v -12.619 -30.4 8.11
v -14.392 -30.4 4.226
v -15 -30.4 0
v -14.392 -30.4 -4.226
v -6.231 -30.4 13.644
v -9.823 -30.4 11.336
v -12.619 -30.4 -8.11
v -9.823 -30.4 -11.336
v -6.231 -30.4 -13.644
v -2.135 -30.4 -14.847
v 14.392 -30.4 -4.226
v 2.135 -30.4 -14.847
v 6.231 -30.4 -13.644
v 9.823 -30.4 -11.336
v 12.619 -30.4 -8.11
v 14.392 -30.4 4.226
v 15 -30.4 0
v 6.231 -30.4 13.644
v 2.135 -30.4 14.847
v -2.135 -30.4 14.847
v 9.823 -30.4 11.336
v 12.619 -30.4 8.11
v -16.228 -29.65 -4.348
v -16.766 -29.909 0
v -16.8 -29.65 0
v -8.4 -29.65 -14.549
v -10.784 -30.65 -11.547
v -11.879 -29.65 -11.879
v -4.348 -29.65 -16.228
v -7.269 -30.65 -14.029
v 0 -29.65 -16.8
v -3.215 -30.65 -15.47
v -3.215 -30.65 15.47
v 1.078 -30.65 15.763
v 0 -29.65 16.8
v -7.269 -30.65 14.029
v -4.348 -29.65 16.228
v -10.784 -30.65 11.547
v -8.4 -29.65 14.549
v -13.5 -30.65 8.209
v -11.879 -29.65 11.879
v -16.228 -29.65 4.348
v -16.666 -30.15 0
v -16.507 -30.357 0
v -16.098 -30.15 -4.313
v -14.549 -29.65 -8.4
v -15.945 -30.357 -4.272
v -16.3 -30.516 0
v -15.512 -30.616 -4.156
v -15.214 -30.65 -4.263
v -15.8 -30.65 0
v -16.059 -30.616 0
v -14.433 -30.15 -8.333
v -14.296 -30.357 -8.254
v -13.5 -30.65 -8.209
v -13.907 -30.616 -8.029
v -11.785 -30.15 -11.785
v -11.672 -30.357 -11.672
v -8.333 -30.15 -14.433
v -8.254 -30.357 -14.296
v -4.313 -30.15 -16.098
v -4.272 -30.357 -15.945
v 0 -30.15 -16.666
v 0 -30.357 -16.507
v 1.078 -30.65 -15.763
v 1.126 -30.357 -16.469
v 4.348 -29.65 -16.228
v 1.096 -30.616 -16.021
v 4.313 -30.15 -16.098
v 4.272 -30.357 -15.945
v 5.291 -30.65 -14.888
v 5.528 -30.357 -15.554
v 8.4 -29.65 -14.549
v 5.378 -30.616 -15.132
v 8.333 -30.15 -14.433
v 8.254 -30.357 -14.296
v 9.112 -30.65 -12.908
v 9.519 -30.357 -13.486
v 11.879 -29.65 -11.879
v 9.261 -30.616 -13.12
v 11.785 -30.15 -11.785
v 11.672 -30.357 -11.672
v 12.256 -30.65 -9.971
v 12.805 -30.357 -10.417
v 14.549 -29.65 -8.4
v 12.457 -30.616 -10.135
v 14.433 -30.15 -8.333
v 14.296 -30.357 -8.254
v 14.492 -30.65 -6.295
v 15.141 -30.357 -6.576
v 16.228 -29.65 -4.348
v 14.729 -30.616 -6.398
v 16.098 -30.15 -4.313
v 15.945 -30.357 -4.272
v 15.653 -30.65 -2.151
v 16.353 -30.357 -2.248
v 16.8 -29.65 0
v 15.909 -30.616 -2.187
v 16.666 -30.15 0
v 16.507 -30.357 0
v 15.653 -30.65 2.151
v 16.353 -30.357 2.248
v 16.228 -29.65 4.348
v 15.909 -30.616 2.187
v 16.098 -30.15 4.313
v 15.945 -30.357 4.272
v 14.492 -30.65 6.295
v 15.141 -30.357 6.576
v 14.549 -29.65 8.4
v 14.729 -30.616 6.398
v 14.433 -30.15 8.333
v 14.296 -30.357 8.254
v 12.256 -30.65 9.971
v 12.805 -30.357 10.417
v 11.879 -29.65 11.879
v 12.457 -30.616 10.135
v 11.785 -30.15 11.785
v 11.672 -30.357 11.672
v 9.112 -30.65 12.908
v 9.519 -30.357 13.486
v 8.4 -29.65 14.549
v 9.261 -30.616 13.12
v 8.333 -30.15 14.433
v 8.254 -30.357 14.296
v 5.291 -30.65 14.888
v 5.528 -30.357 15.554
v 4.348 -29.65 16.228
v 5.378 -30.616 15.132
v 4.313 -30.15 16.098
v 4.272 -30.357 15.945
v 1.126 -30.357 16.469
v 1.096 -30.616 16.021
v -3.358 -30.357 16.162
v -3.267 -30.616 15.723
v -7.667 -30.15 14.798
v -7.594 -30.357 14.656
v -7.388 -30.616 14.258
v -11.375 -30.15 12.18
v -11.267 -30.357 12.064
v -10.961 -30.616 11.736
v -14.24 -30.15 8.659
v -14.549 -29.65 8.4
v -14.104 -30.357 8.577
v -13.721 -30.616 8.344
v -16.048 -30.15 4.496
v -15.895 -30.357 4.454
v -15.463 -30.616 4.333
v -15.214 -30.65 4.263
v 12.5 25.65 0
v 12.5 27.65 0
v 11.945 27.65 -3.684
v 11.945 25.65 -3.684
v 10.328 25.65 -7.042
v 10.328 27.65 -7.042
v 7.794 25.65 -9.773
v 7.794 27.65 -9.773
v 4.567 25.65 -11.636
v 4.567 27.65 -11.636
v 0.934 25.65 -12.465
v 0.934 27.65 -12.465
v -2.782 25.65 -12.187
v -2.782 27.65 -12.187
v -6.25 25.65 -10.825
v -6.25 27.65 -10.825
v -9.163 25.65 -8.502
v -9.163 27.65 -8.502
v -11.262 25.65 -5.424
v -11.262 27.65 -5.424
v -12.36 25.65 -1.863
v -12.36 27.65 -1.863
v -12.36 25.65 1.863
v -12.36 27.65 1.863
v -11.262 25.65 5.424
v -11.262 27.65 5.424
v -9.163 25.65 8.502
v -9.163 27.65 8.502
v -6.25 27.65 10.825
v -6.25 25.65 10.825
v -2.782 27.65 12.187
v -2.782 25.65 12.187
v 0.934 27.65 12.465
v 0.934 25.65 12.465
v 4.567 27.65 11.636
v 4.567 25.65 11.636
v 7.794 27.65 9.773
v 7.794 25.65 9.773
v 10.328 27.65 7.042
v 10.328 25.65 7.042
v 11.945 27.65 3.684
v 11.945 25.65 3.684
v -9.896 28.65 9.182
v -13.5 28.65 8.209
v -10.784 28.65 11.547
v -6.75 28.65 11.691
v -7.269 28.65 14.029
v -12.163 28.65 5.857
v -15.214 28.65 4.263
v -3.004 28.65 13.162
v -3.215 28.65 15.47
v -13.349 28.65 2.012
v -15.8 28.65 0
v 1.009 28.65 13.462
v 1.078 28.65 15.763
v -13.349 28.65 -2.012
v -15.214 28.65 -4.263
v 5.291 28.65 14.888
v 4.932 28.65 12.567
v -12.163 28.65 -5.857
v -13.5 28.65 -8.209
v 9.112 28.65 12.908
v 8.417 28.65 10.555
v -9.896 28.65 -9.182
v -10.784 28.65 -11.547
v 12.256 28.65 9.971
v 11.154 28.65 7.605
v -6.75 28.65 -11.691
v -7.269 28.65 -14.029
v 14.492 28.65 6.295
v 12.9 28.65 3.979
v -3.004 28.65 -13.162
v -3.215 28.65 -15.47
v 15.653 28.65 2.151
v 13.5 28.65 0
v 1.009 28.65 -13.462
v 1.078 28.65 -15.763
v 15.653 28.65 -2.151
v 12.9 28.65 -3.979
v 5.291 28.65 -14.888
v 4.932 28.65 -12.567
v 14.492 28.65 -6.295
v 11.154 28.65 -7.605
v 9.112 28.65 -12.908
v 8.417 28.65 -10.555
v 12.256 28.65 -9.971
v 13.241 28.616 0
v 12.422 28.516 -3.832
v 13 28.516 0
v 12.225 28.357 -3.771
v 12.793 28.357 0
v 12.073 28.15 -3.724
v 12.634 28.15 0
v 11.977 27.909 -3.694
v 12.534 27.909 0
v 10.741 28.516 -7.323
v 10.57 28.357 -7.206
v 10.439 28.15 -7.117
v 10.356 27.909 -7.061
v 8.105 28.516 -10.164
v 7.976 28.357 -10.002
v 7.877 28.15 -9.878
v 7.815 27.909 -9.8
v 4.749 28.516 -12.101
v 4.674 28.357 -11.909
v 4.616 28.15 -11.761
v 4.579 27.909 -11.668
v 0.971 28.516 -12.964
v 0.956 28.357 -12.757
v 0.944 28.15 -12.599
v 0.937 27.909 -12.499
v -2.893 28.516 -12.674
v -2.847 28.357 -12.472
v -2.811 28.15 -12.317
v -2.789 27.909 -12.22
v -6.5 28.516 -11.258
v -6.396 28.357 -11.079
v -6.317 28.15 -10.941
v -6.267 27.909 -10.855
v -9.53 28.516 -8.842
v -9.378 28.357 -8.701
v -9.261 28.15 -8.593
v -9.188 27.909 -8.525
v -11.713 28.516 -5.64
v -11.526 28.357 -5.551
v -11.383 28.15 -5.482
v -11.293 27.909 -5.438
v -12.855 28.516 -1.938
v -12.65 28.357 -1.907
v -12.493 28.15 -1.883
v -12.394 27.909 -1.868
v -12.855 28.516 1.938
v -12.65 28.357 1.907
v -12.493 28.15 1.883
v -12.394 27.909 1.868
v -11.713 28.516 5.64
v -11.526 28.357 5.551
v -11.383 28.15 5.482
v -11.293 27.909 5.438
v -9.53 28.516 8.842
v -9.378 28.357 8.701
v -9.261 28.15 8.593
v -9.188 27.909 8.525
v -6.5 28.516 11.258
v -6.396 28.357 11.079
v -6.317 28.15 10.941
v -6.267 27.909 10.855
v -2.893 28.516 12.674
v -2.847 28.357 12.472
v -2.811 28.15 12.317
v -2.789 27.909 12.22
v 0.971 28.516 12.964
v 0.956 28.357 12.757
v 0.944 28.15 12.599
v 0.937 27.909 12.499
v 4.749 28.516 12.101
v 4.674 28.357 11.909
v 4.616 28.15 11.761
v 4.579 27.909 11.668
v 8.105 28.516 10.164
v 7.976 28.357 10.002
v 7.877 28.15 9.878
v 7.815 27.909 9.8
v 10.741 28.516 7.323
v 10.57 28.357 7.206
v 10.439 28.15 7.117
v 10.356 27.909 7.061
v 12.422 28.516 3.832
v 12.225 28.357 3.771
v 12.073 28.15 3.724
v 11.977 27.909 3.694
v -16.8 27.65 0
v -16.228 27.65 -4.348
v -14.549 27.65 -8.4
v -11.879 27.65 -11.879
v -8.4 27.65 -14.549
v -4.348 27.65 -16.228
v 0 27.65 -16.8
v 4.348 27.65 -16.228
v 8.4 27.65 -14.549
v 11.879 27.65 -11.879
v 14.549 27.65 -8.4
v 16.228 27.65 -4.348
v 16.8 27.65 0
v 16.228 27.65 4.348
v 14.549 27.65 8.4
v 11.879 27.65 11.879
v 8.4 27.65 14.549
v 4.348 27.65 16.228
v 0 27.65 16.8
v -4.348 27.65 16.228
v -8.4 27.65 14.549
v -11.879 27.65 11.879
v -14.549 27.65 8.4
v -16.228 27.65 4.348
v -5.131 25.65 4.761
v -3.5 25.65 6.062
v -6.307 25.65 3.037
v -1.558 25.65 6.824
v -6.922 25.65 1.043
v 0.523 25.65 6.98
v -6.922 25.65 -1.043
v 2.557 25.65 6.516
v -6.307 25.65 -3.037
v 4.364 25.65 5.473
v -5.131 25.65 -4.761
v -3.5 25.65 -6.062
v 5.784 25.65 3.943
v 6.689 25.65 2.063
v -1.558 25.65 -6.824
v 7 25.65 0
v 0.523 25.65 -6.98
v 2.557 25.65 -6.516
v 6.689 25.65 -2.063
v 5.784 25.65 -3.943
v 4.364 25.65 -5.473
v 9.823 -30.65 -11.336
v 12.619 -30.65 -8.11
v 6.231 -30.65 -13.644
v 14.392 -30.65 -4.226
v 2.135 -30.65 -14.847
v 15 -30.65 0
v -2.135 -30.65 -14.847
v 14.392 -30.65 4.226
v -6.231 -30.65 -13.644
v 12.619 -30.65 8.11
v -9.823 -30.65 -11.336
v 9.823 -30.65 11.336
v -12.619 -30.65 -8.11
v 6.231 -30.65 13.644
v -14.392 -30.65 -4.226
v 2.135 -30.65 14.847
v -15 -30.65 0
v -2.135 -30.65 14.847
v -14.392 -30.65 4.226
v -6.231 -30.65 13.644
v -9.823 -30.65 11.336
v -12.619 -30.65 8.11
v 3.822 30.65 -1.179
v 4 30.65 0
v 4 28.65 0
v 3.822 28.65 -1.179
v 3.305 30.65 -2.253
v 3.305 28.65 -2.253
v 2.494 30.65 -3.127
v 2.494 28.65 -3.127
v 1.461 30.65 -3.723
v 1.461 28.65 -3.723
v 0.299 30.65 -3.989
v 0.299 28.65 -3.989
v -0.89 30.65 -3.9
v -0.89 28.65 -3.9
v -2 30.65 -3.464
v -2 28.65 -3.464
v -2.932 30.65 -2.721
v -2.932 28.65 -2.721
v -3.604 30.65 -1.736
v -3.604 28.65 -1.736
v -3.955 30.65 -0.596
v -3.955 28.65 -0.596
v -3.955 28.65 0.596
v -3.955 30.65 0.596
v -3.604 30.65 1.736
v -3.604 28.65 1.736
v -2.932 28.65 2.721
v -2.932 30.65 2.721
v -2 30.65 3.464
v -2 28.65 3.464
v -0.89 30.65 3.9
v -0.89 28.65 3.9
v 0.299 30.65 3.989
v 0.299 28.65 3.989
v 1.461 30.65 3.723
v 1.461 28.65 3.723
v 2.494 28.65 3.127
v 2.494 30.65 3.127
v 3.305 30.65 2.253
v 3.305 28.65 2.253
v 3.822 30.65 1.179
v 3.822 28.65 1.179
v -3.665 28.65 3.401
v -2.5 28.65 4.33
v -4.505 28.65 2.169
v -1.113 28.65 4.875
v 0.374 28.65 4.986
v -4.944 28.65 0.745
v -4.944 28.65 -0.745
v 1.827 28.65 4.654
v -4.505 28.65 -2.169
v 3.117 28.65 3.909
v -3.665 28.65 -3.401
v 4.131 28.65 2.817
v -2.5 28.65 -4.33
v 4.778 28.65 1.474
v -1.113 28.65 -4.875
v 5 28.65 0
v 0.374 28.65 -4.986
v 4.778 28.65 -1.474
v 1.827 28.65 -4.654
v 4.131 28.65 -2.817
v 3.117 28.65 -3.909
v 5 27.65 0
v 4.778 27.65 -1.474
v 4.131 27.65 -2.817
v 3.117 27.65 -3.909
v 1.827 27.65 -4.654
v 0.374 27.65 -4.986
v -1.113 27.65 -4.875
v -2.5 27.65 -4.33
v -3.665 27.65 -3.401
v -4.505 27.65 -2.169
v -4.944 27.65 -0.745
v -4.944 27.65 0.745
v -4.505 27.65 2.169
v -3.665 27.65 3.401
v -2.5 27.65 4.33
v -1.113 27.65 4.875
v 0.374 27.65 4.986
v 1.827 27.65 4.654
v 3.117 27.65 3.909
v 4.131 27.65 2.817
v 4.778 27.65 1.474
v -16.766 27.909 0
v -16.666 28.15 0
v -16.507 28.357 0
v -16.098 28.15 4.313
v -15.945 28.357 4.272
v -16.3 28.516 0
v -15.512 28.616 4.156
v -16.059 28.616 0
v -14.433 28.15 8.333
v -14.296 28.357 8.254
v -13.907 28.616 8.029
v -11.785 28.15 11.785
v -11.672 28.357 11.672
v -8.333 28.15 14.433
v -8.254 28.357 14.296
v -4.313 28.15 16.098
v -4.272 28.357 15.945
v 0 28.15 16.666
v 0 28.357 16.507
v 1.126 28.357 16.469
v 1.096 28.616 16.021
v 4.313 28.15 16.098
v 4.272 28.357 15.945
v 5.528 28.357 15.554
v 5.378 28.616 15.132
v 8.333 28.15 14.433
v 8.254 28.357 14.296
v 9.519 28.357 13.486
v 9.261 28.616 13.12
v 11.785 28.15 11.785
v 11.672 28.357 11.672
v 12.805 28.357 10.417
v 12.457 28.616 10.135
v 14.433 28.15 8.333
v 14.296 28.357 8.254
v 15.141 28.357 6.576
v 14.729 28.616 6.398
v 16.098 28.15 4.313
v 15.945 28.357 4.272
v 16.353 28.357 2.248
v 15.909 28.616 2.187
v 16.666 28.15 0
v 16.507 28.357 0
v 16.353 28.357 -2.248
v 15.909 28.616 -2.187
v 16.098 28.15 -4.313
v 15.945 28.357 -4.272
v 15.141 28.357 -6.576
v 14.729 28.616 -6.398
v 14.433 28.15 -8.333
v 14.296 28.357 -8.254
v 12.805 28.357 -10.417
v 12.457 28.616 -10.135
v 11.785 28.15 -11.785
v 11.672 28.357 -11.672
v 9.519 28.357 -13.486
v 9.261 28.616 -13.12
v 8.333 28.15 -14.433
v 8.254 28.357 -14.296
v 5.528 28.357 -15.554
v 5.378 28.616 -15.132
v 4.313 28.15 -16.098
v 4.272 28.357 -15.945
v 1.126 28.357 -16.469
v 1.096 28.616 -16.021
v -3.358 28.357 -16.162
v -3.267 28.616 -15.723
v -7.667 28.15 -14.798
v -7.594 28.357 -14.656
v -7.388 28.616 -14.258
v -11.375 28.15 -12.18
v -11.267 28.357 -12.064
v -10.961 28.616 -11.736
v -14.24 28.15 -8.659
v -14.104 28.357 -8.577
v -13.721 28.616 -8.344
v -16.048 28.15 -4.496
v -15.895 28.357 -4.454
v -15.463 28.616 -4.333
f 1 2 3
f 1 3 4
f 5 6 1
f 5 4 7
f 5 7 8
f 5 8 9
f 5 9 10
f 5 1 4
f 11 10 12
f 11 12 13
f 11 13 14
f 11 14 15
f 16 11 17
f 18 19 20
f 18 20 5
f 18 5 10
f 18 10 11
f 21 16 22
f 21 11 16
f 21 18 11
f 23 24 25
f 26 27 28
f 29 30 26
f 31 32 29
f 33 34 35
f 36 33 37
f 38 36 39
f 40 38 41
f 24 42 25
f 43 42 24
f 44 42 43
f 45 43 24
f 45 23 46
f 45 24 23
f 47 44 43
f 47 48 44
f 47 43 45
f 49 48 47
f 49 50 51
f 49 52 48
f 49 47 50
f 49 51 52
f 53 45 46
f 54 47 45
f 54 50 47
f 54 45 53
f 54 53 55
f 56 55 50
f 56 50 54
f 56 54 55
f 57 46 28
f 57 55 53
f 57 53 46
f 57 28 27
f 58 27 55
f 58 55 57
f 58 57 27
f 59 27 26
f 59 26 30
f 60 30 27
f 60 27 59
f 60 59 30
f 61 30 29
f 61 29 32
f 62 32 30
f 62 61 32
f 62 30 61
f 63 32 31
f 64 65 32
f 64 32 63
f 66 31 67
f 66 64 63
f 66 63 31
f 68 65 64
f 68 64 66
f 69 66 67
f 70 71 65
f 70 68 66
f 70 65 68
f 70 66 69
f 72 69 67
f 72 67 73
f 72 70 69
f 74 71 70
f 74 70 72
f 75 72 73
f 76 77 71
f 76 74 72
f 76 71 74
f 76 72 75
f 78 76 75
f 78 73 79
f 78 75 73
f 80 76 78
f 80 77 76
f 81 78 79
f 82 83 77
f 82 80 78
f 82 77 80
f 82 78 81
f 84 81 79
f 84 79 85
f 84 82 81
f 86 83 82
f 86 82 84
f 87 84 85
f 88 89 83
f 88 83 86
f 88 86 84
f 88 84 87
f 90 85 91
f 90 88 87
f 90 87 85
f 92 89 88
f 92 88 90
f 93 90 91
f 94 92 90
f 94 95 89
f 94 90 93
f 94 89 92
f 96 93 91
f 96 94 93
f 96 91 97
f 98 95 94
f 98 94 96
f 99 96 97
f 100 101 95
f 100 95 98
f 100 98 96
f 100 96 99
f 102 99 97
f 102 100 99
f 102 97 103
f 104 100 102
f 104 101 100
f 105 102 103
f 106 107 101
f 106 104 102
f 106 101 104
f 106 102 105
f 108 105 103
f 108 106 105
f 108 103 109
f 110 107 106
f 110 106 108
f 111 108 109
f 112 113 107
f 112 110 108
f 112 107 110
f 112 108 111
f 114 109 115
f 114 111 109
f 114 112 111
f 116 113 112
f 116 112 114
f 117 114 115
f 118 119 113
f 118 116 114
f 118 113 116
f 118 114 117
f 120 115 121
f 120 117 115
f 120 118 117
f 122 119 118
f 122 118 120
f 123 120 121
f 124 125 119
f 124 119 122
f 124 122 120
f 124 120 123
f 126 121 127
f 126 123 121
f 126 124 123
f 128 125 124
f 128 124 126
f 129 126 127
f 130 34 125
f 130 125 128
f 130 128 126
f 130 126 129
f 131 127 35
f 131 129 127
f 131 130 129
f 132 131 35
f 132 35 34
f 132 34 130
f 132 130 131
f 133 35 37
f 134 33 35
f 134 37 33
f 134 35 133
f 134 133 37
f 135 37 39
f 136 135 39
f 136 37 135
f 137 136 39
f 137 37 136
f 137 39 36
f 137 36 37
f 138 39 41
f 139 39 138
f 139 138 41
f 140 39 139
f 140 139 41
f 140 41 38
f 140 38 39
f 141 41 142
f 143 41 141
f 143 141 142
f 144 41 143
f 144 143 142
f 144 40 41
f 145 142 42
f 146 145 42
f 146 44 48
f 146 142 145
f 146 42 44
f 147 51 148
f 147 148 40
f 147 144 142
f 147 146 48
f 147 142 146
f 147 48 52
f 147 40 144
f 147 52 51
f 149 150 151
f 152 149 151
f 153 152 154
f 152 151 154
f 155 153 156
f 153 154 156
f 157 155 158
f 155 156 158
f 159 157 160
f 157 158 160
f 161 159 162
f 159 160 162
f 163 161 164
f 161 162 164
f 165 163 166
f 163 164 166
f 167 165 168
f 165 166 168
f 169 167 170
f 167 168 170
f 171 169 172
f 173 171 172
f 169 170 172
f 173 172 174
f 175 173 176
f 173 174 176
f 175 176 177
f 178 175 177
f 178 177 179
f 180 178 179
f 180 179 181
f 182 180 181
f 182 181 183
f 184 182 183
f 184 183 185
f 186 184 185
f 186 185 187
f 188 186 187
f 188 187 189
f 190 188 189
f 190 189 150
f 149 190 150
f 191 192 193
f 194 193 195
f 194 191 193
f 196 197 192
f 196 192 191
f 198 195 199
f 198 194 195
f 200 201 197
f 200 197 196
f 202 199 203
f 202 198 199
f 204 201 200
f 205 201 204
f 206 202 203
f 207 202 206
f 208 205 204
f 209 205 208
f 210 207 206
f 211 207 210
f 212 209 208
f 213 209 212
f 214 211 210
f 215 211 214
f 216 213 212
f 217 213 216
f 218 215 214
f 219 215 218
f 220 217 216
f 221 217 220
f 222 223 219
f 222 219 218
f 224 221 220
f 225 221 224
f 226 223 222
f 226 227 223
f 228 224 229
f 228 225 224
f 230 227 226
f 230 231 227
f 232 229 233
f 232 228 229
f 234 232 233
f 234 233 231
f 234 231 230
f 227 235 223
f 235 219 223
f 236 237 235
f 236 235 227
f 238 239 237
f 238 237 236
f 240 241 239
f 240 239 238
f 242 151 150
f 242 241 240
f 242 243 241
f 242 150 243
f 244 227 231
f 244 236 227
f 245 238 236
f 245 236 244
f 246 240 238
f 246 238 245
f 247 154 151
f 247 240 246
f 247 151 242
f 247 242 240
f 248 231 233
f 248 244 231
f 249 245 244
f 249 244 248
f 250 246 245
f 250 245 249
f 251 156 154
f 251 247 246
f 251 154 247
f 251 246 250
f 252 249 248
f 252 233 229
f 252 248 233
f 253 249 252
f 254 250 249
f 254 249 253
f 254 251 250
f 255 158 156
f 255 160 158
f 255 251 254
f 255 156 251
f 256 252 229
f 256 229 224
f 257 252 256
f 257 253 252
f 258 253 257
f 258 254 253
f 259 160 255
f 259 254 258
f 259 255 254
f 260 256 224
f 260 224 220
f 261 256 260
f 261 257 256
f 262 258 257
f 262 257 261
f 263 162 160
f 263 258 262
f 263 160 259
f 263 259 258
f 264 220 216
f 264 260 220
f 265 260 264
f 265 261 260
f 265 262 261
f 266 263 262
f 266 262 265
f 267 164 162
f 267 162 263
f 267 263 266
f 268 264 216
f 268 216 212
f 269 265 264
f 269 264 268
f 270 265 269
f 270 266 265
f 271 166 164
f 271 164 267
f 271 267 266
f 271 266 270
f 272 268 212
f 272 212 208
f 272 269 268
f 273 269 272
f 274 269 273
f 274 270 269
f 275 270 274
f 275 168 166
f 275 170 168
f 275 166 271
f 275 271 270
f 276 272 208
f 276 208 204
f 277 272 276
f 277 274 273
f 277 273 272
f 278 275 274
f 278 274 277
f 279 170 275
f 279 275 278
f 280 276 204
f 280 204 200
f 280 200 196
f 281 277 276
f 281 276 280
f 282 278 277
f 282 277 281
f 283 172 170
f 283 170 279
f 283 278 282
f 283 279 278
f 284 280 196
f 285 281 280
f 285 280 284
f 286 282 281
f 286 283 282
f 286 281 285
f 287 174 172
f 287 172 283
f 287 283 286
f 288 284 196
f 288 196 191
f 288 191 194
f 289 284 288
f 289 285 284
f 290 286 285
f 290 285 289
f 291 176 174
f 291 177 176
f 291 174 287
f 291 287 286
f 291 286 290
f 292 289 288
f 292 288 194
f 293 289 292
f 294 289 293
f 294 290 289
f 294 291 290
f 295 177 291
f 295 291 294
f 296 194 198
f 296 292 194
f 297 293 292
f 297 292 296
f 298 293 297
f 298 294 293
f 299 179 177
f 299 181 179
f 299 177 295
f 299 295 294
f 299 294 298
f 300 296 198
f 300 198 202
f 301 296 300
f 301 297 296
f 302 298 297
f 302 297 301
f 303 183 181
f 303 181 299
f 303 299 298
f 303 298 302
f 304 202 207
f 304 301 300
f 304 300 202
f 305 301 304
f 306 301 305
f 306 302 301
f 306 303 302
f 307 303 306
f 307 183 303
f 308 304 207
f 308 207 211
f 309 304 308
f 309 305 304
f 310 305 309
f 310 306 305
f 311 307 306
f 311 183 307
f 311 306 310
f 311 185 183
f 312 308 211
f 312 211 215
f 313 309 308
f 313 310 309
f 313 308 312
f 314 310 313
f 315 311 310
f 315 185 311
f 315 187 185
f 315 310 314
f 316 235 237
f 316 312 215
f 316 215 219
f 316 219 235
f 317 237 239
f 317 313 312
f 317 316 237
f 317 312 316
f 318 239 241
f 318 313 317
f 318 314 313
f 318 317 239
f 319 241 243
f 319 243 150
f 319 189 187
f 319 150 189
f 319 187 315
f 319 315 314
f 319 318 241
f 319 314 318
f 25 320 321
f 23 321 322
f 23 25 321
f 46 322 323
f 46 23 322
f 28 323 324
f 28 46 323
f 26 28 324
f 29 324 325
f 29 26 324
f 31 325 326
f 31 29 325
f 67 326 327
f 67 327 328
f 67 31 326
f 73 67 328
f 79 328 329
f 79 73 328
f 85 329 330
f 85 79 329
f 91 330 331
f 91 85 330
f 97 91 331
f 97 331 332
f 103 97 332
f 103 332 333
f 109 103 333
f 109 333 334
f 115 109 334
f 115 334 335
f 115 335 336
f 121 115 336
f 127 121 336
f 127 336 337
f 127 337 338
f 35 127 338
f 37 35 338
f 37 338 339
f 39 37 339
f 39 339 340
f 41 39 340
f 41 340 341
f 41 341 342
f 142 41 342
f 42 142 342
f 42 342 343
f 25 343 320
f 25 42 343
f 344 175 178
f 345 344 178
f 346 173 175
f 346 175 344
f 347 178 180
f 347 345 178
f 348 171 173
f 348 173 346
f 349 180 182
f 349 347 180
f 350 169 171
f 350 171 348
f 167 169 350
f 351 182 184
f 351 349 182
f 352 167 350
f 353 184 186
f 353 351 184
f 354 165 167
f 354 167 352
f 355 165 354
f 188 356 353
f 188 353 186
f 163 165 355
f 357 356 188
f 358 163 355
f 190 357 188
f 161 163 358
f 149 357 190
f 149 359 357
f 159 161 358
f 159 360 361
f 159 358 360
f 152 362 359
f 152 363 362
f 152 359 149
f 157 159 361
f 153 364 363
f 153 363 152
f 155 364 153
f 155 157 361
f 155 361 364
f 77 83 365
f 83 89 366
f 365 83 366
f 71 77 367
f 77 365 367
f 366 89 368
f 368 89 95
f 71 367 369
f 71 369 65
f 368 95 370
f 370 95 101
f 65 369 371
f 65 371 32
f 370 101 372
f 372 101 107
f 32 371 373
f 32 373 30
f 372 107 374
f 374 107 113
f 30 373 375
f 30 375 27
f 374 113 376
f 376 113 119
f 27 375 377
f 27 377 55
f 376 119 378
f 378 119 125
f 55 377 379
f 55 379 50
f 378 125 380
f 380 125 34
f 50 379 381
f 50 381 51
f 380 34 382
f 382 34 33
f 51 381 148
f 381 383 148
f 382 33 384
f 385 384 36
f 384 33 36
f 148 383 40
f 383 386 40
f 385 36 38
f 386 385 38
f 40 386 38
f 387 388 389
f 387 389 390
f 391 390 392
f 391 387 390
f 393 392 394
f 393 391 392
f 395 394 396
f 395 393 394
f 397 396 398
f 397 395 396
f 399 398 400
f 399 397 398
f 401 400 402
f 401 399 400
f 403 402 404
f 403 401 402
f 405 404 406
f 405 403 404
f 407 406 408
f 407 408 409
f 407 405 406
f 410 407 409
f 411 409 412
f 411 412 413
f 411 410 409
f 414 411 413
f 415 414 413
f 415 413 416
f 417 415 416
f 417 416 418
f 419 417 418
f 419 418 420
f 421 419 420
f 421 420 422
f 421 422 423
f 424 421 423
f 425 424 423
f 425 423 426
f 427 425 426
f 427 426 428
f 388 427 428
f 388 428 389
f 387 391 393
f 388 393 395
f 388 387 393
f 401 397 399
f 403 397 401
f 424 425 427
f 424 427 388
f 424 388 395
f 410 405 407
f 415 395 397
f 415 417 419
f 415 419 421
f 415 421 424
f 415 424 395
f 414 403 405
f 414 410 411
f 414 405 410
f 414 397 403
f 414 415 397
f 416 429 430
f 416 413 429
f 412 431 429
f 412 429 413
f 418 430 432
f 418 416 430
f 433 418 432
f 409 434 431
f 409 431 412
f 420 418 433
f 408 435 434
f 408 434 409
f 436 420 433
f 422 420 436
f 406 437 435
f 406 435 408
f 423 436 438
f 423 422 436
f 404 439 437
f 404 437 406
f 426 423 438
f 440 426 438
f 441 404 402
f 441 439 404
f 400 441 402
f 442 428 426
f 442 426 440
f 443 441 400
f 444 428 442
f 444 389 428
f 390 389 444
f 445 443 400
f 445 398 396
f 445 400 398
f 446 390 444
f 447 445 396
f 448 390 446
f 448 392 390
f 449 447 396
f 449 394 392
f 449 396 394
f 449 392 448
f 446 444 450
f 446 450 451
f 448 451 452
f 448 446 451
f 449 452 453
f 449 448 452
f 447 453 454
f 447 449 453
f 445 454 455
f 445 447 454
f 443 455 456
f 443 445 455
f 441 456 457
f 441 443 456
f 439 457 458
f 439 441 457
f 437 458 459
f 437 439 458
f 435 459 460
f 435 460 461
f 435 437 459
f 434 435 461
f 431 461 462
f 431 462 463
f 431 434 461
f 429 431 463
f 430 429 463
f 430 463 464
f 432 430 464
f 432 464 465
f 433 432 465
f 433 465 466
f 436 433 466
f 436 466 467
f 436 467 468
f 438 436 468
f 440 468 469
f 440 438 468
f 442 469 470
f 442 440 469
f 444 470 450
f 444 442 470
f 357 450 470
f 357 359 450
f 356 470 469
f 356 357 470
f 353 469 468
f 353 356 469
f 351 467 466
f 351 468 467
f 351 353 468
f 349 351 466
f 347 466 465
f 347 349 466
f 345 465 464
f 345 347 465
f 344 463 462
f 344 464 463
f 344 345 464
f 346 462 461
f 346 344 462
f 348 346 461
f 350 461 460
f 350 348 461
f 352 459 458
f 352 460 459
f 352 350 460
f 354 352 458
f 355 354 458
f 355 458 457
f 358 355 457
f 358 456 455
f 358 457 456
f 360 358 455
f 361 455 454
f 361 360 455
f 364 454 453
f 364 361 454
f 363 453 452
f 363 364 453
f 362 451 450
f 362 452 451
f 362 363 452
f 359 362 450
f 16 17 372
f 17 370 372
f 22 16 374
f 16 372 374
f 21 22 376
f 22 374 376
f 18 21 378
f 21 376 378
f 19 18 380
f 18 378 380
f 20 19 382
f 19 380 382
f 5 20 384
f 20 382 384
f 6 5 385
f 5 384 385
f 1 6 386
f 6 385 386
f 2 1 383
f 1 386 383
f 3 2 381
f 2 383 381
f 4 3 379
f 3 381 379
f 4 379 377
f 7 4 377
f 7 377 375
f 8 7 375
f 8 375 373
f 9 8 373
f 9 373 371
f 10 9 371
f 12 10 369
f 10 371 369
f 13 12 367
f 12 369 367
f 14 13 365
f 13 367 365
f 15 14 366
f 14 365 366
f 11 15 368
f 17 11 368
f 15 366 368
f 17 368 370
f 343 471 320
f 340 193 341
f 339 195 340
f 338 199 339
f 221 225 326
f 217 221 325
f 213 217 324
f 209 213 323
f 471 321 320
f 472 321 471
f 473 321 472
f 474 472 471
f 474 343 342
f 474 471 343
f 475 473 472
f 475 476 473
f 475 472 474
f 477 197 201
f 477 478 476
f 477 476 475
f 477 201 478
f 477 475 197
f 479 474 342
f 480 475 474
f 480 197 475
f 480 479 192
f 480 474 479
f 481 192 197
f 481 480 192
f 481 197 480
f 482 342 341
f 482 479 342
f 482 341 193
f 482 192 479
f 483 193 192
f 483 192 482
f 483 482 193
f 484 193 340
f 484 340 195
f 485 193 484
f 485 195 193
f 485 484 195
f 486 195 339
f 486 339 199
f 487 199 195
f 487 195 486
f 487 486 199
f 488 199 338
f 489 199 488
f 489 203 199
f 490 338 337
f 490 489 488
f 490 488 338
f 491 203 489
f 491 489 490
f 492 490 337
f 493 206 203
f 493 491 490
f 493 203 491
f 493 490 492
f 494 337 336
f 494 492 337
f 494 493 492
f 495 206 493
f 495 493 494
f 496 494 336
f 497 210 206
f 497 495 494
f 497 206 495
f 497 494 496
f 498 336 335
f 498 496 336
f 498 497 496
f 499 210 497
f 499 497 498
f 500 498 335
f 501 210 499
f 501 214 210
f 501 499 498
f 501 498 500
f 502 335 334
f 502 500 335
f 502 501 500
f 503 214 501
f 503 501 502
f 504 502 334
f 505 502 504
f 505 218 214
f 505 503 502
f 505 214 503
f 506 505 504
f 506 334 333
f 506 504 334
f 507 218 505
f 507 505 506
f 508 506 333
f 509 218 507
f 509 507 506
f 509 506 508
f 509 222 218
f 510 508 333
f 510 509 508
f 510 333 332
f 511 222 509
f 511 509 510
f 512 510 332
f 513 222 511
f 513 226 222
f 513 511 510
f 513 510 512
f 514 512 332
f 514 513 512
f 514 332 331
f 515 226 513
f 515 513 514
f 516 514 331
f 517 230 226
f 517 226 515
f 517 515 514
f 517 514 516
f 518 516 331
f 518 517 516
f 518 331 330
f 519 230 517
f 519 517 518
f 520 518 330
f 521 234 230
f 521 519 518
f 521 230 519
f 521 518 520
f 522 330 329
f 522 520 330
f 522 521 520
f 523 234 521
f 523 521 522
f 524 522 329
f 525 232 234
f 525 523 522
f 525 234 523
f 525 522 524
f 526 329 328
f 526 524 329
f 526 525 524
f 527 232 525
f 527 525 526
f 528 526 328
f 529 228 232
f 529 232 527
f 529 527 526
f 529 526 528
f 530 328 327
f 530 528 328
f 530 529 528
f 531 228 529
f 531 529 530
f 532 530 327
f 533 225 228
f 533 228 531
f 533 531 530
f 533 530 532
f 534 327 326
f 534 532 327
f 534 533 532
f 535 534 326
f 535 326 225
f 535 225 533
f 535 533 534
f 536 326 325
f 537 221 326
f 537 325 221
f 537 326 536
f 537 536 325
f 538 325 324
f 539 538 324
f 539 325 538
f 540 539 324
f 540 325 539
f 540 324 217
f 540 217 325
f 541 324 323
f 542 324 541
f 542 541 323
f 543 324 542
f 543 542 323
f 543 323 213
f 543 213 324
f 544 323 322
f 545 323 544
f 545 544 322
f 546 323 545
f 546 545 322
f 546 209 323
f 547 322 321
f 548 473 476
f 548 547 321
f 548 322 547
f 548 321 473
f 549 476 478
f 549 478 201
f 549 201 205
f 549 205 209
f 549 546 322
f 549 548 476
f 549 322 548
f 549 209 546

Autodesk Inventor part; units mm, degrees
ref_plane "YZ Plane" through (0, 0, 0) normal (1, 0, 0) x (0, 1, 0)
ref_plane "XZ Plane" through (0, 0, 0) normal (0, 1, 0) x (-1, 0, 0)
ref_plane "XY Plane" through (0, 0, 0) normal (0, 0, 1) x (1, 0, 0)
sketch "Sketch1" plane through (0, 0, 0) normal (0, 0, 1) x (1, 0, 0)
  line L0 (-16.8, -30.65) -> (0, -30.65)
  line L1 (0, -30.65) -> (0, 30.65)
  line L2 (0, 30.65) -> (-16.8, 30.65)
  line L3 (-16.8, 30.65) -> (-16.8, -30.65)
  point P0 (0, 0)
  point P1 (0, 0)
  dimension "d0" = 16.8
  dimension "d1" = 61.3
revolve "Revolution1" add sketch "Sketch1" angle 360 about axis through (0, -30.65, 0) along (0, 1, 0)
sketch "Sketch2" plane through (0, 30.65, 0) normal (0, 1, 0) x (1, 0, 0)
  circle A0 centre (0, 0) radius 16.8 projected
  circle A1 centre (0, 0) radius 12.5
  circle A2 centre (0, 0) radius 5
  dimension "d3" = 10
  dimension "d4" = 7.5
extrude "Extrusion1" cut sketch "Sketch2" against normal blind 5 contours A1
sketch "Sketch3" plane through (0, 30.65, 0) normal (0, 1, 0) x (1, 0, 0)
  circle A0 centre (0, 0) radius 16.8 projected
  circle A1 centre (0, 0) radius 12.5 projected
extrude "Extrusion2" cut sketch "Sketch3" against normal blind 2
fillet "Fillet1" radius 1 3 edges at (16.8, -30.65, 0) (16.8, 28.65, 0) (-12.5, 28.65, 0)
sketch "Sketch4" plane through (0, 30.65, 0) normal (0, 1, 0) x (1, 0, 0)
  circle A0 centre (0, 0) radius 5 projected
  circle A1 centre (0, 0) radius 4
  dimension "d10" = 1
extrude "Extrusion3" cut sketch "Sketch4" against normal blind 2
chamfer "Chamfer1" distance 2 angle 45 1 edges at (-5, 25.65, 0)
sketch "Sketch5" plane through (0, -30.65, 0) normal (0, -1, 0) x (1, 0, 0)
  circle A0 centre (0, 0) radius 15.8 projected
  circle A1 centre (0, 0) radius 15
  dimension "d16" = 30
extrude "Extrusion4" cut sketch "Sketch5" against normal blind 0.25 contours A1
properties part number "D Cell"
